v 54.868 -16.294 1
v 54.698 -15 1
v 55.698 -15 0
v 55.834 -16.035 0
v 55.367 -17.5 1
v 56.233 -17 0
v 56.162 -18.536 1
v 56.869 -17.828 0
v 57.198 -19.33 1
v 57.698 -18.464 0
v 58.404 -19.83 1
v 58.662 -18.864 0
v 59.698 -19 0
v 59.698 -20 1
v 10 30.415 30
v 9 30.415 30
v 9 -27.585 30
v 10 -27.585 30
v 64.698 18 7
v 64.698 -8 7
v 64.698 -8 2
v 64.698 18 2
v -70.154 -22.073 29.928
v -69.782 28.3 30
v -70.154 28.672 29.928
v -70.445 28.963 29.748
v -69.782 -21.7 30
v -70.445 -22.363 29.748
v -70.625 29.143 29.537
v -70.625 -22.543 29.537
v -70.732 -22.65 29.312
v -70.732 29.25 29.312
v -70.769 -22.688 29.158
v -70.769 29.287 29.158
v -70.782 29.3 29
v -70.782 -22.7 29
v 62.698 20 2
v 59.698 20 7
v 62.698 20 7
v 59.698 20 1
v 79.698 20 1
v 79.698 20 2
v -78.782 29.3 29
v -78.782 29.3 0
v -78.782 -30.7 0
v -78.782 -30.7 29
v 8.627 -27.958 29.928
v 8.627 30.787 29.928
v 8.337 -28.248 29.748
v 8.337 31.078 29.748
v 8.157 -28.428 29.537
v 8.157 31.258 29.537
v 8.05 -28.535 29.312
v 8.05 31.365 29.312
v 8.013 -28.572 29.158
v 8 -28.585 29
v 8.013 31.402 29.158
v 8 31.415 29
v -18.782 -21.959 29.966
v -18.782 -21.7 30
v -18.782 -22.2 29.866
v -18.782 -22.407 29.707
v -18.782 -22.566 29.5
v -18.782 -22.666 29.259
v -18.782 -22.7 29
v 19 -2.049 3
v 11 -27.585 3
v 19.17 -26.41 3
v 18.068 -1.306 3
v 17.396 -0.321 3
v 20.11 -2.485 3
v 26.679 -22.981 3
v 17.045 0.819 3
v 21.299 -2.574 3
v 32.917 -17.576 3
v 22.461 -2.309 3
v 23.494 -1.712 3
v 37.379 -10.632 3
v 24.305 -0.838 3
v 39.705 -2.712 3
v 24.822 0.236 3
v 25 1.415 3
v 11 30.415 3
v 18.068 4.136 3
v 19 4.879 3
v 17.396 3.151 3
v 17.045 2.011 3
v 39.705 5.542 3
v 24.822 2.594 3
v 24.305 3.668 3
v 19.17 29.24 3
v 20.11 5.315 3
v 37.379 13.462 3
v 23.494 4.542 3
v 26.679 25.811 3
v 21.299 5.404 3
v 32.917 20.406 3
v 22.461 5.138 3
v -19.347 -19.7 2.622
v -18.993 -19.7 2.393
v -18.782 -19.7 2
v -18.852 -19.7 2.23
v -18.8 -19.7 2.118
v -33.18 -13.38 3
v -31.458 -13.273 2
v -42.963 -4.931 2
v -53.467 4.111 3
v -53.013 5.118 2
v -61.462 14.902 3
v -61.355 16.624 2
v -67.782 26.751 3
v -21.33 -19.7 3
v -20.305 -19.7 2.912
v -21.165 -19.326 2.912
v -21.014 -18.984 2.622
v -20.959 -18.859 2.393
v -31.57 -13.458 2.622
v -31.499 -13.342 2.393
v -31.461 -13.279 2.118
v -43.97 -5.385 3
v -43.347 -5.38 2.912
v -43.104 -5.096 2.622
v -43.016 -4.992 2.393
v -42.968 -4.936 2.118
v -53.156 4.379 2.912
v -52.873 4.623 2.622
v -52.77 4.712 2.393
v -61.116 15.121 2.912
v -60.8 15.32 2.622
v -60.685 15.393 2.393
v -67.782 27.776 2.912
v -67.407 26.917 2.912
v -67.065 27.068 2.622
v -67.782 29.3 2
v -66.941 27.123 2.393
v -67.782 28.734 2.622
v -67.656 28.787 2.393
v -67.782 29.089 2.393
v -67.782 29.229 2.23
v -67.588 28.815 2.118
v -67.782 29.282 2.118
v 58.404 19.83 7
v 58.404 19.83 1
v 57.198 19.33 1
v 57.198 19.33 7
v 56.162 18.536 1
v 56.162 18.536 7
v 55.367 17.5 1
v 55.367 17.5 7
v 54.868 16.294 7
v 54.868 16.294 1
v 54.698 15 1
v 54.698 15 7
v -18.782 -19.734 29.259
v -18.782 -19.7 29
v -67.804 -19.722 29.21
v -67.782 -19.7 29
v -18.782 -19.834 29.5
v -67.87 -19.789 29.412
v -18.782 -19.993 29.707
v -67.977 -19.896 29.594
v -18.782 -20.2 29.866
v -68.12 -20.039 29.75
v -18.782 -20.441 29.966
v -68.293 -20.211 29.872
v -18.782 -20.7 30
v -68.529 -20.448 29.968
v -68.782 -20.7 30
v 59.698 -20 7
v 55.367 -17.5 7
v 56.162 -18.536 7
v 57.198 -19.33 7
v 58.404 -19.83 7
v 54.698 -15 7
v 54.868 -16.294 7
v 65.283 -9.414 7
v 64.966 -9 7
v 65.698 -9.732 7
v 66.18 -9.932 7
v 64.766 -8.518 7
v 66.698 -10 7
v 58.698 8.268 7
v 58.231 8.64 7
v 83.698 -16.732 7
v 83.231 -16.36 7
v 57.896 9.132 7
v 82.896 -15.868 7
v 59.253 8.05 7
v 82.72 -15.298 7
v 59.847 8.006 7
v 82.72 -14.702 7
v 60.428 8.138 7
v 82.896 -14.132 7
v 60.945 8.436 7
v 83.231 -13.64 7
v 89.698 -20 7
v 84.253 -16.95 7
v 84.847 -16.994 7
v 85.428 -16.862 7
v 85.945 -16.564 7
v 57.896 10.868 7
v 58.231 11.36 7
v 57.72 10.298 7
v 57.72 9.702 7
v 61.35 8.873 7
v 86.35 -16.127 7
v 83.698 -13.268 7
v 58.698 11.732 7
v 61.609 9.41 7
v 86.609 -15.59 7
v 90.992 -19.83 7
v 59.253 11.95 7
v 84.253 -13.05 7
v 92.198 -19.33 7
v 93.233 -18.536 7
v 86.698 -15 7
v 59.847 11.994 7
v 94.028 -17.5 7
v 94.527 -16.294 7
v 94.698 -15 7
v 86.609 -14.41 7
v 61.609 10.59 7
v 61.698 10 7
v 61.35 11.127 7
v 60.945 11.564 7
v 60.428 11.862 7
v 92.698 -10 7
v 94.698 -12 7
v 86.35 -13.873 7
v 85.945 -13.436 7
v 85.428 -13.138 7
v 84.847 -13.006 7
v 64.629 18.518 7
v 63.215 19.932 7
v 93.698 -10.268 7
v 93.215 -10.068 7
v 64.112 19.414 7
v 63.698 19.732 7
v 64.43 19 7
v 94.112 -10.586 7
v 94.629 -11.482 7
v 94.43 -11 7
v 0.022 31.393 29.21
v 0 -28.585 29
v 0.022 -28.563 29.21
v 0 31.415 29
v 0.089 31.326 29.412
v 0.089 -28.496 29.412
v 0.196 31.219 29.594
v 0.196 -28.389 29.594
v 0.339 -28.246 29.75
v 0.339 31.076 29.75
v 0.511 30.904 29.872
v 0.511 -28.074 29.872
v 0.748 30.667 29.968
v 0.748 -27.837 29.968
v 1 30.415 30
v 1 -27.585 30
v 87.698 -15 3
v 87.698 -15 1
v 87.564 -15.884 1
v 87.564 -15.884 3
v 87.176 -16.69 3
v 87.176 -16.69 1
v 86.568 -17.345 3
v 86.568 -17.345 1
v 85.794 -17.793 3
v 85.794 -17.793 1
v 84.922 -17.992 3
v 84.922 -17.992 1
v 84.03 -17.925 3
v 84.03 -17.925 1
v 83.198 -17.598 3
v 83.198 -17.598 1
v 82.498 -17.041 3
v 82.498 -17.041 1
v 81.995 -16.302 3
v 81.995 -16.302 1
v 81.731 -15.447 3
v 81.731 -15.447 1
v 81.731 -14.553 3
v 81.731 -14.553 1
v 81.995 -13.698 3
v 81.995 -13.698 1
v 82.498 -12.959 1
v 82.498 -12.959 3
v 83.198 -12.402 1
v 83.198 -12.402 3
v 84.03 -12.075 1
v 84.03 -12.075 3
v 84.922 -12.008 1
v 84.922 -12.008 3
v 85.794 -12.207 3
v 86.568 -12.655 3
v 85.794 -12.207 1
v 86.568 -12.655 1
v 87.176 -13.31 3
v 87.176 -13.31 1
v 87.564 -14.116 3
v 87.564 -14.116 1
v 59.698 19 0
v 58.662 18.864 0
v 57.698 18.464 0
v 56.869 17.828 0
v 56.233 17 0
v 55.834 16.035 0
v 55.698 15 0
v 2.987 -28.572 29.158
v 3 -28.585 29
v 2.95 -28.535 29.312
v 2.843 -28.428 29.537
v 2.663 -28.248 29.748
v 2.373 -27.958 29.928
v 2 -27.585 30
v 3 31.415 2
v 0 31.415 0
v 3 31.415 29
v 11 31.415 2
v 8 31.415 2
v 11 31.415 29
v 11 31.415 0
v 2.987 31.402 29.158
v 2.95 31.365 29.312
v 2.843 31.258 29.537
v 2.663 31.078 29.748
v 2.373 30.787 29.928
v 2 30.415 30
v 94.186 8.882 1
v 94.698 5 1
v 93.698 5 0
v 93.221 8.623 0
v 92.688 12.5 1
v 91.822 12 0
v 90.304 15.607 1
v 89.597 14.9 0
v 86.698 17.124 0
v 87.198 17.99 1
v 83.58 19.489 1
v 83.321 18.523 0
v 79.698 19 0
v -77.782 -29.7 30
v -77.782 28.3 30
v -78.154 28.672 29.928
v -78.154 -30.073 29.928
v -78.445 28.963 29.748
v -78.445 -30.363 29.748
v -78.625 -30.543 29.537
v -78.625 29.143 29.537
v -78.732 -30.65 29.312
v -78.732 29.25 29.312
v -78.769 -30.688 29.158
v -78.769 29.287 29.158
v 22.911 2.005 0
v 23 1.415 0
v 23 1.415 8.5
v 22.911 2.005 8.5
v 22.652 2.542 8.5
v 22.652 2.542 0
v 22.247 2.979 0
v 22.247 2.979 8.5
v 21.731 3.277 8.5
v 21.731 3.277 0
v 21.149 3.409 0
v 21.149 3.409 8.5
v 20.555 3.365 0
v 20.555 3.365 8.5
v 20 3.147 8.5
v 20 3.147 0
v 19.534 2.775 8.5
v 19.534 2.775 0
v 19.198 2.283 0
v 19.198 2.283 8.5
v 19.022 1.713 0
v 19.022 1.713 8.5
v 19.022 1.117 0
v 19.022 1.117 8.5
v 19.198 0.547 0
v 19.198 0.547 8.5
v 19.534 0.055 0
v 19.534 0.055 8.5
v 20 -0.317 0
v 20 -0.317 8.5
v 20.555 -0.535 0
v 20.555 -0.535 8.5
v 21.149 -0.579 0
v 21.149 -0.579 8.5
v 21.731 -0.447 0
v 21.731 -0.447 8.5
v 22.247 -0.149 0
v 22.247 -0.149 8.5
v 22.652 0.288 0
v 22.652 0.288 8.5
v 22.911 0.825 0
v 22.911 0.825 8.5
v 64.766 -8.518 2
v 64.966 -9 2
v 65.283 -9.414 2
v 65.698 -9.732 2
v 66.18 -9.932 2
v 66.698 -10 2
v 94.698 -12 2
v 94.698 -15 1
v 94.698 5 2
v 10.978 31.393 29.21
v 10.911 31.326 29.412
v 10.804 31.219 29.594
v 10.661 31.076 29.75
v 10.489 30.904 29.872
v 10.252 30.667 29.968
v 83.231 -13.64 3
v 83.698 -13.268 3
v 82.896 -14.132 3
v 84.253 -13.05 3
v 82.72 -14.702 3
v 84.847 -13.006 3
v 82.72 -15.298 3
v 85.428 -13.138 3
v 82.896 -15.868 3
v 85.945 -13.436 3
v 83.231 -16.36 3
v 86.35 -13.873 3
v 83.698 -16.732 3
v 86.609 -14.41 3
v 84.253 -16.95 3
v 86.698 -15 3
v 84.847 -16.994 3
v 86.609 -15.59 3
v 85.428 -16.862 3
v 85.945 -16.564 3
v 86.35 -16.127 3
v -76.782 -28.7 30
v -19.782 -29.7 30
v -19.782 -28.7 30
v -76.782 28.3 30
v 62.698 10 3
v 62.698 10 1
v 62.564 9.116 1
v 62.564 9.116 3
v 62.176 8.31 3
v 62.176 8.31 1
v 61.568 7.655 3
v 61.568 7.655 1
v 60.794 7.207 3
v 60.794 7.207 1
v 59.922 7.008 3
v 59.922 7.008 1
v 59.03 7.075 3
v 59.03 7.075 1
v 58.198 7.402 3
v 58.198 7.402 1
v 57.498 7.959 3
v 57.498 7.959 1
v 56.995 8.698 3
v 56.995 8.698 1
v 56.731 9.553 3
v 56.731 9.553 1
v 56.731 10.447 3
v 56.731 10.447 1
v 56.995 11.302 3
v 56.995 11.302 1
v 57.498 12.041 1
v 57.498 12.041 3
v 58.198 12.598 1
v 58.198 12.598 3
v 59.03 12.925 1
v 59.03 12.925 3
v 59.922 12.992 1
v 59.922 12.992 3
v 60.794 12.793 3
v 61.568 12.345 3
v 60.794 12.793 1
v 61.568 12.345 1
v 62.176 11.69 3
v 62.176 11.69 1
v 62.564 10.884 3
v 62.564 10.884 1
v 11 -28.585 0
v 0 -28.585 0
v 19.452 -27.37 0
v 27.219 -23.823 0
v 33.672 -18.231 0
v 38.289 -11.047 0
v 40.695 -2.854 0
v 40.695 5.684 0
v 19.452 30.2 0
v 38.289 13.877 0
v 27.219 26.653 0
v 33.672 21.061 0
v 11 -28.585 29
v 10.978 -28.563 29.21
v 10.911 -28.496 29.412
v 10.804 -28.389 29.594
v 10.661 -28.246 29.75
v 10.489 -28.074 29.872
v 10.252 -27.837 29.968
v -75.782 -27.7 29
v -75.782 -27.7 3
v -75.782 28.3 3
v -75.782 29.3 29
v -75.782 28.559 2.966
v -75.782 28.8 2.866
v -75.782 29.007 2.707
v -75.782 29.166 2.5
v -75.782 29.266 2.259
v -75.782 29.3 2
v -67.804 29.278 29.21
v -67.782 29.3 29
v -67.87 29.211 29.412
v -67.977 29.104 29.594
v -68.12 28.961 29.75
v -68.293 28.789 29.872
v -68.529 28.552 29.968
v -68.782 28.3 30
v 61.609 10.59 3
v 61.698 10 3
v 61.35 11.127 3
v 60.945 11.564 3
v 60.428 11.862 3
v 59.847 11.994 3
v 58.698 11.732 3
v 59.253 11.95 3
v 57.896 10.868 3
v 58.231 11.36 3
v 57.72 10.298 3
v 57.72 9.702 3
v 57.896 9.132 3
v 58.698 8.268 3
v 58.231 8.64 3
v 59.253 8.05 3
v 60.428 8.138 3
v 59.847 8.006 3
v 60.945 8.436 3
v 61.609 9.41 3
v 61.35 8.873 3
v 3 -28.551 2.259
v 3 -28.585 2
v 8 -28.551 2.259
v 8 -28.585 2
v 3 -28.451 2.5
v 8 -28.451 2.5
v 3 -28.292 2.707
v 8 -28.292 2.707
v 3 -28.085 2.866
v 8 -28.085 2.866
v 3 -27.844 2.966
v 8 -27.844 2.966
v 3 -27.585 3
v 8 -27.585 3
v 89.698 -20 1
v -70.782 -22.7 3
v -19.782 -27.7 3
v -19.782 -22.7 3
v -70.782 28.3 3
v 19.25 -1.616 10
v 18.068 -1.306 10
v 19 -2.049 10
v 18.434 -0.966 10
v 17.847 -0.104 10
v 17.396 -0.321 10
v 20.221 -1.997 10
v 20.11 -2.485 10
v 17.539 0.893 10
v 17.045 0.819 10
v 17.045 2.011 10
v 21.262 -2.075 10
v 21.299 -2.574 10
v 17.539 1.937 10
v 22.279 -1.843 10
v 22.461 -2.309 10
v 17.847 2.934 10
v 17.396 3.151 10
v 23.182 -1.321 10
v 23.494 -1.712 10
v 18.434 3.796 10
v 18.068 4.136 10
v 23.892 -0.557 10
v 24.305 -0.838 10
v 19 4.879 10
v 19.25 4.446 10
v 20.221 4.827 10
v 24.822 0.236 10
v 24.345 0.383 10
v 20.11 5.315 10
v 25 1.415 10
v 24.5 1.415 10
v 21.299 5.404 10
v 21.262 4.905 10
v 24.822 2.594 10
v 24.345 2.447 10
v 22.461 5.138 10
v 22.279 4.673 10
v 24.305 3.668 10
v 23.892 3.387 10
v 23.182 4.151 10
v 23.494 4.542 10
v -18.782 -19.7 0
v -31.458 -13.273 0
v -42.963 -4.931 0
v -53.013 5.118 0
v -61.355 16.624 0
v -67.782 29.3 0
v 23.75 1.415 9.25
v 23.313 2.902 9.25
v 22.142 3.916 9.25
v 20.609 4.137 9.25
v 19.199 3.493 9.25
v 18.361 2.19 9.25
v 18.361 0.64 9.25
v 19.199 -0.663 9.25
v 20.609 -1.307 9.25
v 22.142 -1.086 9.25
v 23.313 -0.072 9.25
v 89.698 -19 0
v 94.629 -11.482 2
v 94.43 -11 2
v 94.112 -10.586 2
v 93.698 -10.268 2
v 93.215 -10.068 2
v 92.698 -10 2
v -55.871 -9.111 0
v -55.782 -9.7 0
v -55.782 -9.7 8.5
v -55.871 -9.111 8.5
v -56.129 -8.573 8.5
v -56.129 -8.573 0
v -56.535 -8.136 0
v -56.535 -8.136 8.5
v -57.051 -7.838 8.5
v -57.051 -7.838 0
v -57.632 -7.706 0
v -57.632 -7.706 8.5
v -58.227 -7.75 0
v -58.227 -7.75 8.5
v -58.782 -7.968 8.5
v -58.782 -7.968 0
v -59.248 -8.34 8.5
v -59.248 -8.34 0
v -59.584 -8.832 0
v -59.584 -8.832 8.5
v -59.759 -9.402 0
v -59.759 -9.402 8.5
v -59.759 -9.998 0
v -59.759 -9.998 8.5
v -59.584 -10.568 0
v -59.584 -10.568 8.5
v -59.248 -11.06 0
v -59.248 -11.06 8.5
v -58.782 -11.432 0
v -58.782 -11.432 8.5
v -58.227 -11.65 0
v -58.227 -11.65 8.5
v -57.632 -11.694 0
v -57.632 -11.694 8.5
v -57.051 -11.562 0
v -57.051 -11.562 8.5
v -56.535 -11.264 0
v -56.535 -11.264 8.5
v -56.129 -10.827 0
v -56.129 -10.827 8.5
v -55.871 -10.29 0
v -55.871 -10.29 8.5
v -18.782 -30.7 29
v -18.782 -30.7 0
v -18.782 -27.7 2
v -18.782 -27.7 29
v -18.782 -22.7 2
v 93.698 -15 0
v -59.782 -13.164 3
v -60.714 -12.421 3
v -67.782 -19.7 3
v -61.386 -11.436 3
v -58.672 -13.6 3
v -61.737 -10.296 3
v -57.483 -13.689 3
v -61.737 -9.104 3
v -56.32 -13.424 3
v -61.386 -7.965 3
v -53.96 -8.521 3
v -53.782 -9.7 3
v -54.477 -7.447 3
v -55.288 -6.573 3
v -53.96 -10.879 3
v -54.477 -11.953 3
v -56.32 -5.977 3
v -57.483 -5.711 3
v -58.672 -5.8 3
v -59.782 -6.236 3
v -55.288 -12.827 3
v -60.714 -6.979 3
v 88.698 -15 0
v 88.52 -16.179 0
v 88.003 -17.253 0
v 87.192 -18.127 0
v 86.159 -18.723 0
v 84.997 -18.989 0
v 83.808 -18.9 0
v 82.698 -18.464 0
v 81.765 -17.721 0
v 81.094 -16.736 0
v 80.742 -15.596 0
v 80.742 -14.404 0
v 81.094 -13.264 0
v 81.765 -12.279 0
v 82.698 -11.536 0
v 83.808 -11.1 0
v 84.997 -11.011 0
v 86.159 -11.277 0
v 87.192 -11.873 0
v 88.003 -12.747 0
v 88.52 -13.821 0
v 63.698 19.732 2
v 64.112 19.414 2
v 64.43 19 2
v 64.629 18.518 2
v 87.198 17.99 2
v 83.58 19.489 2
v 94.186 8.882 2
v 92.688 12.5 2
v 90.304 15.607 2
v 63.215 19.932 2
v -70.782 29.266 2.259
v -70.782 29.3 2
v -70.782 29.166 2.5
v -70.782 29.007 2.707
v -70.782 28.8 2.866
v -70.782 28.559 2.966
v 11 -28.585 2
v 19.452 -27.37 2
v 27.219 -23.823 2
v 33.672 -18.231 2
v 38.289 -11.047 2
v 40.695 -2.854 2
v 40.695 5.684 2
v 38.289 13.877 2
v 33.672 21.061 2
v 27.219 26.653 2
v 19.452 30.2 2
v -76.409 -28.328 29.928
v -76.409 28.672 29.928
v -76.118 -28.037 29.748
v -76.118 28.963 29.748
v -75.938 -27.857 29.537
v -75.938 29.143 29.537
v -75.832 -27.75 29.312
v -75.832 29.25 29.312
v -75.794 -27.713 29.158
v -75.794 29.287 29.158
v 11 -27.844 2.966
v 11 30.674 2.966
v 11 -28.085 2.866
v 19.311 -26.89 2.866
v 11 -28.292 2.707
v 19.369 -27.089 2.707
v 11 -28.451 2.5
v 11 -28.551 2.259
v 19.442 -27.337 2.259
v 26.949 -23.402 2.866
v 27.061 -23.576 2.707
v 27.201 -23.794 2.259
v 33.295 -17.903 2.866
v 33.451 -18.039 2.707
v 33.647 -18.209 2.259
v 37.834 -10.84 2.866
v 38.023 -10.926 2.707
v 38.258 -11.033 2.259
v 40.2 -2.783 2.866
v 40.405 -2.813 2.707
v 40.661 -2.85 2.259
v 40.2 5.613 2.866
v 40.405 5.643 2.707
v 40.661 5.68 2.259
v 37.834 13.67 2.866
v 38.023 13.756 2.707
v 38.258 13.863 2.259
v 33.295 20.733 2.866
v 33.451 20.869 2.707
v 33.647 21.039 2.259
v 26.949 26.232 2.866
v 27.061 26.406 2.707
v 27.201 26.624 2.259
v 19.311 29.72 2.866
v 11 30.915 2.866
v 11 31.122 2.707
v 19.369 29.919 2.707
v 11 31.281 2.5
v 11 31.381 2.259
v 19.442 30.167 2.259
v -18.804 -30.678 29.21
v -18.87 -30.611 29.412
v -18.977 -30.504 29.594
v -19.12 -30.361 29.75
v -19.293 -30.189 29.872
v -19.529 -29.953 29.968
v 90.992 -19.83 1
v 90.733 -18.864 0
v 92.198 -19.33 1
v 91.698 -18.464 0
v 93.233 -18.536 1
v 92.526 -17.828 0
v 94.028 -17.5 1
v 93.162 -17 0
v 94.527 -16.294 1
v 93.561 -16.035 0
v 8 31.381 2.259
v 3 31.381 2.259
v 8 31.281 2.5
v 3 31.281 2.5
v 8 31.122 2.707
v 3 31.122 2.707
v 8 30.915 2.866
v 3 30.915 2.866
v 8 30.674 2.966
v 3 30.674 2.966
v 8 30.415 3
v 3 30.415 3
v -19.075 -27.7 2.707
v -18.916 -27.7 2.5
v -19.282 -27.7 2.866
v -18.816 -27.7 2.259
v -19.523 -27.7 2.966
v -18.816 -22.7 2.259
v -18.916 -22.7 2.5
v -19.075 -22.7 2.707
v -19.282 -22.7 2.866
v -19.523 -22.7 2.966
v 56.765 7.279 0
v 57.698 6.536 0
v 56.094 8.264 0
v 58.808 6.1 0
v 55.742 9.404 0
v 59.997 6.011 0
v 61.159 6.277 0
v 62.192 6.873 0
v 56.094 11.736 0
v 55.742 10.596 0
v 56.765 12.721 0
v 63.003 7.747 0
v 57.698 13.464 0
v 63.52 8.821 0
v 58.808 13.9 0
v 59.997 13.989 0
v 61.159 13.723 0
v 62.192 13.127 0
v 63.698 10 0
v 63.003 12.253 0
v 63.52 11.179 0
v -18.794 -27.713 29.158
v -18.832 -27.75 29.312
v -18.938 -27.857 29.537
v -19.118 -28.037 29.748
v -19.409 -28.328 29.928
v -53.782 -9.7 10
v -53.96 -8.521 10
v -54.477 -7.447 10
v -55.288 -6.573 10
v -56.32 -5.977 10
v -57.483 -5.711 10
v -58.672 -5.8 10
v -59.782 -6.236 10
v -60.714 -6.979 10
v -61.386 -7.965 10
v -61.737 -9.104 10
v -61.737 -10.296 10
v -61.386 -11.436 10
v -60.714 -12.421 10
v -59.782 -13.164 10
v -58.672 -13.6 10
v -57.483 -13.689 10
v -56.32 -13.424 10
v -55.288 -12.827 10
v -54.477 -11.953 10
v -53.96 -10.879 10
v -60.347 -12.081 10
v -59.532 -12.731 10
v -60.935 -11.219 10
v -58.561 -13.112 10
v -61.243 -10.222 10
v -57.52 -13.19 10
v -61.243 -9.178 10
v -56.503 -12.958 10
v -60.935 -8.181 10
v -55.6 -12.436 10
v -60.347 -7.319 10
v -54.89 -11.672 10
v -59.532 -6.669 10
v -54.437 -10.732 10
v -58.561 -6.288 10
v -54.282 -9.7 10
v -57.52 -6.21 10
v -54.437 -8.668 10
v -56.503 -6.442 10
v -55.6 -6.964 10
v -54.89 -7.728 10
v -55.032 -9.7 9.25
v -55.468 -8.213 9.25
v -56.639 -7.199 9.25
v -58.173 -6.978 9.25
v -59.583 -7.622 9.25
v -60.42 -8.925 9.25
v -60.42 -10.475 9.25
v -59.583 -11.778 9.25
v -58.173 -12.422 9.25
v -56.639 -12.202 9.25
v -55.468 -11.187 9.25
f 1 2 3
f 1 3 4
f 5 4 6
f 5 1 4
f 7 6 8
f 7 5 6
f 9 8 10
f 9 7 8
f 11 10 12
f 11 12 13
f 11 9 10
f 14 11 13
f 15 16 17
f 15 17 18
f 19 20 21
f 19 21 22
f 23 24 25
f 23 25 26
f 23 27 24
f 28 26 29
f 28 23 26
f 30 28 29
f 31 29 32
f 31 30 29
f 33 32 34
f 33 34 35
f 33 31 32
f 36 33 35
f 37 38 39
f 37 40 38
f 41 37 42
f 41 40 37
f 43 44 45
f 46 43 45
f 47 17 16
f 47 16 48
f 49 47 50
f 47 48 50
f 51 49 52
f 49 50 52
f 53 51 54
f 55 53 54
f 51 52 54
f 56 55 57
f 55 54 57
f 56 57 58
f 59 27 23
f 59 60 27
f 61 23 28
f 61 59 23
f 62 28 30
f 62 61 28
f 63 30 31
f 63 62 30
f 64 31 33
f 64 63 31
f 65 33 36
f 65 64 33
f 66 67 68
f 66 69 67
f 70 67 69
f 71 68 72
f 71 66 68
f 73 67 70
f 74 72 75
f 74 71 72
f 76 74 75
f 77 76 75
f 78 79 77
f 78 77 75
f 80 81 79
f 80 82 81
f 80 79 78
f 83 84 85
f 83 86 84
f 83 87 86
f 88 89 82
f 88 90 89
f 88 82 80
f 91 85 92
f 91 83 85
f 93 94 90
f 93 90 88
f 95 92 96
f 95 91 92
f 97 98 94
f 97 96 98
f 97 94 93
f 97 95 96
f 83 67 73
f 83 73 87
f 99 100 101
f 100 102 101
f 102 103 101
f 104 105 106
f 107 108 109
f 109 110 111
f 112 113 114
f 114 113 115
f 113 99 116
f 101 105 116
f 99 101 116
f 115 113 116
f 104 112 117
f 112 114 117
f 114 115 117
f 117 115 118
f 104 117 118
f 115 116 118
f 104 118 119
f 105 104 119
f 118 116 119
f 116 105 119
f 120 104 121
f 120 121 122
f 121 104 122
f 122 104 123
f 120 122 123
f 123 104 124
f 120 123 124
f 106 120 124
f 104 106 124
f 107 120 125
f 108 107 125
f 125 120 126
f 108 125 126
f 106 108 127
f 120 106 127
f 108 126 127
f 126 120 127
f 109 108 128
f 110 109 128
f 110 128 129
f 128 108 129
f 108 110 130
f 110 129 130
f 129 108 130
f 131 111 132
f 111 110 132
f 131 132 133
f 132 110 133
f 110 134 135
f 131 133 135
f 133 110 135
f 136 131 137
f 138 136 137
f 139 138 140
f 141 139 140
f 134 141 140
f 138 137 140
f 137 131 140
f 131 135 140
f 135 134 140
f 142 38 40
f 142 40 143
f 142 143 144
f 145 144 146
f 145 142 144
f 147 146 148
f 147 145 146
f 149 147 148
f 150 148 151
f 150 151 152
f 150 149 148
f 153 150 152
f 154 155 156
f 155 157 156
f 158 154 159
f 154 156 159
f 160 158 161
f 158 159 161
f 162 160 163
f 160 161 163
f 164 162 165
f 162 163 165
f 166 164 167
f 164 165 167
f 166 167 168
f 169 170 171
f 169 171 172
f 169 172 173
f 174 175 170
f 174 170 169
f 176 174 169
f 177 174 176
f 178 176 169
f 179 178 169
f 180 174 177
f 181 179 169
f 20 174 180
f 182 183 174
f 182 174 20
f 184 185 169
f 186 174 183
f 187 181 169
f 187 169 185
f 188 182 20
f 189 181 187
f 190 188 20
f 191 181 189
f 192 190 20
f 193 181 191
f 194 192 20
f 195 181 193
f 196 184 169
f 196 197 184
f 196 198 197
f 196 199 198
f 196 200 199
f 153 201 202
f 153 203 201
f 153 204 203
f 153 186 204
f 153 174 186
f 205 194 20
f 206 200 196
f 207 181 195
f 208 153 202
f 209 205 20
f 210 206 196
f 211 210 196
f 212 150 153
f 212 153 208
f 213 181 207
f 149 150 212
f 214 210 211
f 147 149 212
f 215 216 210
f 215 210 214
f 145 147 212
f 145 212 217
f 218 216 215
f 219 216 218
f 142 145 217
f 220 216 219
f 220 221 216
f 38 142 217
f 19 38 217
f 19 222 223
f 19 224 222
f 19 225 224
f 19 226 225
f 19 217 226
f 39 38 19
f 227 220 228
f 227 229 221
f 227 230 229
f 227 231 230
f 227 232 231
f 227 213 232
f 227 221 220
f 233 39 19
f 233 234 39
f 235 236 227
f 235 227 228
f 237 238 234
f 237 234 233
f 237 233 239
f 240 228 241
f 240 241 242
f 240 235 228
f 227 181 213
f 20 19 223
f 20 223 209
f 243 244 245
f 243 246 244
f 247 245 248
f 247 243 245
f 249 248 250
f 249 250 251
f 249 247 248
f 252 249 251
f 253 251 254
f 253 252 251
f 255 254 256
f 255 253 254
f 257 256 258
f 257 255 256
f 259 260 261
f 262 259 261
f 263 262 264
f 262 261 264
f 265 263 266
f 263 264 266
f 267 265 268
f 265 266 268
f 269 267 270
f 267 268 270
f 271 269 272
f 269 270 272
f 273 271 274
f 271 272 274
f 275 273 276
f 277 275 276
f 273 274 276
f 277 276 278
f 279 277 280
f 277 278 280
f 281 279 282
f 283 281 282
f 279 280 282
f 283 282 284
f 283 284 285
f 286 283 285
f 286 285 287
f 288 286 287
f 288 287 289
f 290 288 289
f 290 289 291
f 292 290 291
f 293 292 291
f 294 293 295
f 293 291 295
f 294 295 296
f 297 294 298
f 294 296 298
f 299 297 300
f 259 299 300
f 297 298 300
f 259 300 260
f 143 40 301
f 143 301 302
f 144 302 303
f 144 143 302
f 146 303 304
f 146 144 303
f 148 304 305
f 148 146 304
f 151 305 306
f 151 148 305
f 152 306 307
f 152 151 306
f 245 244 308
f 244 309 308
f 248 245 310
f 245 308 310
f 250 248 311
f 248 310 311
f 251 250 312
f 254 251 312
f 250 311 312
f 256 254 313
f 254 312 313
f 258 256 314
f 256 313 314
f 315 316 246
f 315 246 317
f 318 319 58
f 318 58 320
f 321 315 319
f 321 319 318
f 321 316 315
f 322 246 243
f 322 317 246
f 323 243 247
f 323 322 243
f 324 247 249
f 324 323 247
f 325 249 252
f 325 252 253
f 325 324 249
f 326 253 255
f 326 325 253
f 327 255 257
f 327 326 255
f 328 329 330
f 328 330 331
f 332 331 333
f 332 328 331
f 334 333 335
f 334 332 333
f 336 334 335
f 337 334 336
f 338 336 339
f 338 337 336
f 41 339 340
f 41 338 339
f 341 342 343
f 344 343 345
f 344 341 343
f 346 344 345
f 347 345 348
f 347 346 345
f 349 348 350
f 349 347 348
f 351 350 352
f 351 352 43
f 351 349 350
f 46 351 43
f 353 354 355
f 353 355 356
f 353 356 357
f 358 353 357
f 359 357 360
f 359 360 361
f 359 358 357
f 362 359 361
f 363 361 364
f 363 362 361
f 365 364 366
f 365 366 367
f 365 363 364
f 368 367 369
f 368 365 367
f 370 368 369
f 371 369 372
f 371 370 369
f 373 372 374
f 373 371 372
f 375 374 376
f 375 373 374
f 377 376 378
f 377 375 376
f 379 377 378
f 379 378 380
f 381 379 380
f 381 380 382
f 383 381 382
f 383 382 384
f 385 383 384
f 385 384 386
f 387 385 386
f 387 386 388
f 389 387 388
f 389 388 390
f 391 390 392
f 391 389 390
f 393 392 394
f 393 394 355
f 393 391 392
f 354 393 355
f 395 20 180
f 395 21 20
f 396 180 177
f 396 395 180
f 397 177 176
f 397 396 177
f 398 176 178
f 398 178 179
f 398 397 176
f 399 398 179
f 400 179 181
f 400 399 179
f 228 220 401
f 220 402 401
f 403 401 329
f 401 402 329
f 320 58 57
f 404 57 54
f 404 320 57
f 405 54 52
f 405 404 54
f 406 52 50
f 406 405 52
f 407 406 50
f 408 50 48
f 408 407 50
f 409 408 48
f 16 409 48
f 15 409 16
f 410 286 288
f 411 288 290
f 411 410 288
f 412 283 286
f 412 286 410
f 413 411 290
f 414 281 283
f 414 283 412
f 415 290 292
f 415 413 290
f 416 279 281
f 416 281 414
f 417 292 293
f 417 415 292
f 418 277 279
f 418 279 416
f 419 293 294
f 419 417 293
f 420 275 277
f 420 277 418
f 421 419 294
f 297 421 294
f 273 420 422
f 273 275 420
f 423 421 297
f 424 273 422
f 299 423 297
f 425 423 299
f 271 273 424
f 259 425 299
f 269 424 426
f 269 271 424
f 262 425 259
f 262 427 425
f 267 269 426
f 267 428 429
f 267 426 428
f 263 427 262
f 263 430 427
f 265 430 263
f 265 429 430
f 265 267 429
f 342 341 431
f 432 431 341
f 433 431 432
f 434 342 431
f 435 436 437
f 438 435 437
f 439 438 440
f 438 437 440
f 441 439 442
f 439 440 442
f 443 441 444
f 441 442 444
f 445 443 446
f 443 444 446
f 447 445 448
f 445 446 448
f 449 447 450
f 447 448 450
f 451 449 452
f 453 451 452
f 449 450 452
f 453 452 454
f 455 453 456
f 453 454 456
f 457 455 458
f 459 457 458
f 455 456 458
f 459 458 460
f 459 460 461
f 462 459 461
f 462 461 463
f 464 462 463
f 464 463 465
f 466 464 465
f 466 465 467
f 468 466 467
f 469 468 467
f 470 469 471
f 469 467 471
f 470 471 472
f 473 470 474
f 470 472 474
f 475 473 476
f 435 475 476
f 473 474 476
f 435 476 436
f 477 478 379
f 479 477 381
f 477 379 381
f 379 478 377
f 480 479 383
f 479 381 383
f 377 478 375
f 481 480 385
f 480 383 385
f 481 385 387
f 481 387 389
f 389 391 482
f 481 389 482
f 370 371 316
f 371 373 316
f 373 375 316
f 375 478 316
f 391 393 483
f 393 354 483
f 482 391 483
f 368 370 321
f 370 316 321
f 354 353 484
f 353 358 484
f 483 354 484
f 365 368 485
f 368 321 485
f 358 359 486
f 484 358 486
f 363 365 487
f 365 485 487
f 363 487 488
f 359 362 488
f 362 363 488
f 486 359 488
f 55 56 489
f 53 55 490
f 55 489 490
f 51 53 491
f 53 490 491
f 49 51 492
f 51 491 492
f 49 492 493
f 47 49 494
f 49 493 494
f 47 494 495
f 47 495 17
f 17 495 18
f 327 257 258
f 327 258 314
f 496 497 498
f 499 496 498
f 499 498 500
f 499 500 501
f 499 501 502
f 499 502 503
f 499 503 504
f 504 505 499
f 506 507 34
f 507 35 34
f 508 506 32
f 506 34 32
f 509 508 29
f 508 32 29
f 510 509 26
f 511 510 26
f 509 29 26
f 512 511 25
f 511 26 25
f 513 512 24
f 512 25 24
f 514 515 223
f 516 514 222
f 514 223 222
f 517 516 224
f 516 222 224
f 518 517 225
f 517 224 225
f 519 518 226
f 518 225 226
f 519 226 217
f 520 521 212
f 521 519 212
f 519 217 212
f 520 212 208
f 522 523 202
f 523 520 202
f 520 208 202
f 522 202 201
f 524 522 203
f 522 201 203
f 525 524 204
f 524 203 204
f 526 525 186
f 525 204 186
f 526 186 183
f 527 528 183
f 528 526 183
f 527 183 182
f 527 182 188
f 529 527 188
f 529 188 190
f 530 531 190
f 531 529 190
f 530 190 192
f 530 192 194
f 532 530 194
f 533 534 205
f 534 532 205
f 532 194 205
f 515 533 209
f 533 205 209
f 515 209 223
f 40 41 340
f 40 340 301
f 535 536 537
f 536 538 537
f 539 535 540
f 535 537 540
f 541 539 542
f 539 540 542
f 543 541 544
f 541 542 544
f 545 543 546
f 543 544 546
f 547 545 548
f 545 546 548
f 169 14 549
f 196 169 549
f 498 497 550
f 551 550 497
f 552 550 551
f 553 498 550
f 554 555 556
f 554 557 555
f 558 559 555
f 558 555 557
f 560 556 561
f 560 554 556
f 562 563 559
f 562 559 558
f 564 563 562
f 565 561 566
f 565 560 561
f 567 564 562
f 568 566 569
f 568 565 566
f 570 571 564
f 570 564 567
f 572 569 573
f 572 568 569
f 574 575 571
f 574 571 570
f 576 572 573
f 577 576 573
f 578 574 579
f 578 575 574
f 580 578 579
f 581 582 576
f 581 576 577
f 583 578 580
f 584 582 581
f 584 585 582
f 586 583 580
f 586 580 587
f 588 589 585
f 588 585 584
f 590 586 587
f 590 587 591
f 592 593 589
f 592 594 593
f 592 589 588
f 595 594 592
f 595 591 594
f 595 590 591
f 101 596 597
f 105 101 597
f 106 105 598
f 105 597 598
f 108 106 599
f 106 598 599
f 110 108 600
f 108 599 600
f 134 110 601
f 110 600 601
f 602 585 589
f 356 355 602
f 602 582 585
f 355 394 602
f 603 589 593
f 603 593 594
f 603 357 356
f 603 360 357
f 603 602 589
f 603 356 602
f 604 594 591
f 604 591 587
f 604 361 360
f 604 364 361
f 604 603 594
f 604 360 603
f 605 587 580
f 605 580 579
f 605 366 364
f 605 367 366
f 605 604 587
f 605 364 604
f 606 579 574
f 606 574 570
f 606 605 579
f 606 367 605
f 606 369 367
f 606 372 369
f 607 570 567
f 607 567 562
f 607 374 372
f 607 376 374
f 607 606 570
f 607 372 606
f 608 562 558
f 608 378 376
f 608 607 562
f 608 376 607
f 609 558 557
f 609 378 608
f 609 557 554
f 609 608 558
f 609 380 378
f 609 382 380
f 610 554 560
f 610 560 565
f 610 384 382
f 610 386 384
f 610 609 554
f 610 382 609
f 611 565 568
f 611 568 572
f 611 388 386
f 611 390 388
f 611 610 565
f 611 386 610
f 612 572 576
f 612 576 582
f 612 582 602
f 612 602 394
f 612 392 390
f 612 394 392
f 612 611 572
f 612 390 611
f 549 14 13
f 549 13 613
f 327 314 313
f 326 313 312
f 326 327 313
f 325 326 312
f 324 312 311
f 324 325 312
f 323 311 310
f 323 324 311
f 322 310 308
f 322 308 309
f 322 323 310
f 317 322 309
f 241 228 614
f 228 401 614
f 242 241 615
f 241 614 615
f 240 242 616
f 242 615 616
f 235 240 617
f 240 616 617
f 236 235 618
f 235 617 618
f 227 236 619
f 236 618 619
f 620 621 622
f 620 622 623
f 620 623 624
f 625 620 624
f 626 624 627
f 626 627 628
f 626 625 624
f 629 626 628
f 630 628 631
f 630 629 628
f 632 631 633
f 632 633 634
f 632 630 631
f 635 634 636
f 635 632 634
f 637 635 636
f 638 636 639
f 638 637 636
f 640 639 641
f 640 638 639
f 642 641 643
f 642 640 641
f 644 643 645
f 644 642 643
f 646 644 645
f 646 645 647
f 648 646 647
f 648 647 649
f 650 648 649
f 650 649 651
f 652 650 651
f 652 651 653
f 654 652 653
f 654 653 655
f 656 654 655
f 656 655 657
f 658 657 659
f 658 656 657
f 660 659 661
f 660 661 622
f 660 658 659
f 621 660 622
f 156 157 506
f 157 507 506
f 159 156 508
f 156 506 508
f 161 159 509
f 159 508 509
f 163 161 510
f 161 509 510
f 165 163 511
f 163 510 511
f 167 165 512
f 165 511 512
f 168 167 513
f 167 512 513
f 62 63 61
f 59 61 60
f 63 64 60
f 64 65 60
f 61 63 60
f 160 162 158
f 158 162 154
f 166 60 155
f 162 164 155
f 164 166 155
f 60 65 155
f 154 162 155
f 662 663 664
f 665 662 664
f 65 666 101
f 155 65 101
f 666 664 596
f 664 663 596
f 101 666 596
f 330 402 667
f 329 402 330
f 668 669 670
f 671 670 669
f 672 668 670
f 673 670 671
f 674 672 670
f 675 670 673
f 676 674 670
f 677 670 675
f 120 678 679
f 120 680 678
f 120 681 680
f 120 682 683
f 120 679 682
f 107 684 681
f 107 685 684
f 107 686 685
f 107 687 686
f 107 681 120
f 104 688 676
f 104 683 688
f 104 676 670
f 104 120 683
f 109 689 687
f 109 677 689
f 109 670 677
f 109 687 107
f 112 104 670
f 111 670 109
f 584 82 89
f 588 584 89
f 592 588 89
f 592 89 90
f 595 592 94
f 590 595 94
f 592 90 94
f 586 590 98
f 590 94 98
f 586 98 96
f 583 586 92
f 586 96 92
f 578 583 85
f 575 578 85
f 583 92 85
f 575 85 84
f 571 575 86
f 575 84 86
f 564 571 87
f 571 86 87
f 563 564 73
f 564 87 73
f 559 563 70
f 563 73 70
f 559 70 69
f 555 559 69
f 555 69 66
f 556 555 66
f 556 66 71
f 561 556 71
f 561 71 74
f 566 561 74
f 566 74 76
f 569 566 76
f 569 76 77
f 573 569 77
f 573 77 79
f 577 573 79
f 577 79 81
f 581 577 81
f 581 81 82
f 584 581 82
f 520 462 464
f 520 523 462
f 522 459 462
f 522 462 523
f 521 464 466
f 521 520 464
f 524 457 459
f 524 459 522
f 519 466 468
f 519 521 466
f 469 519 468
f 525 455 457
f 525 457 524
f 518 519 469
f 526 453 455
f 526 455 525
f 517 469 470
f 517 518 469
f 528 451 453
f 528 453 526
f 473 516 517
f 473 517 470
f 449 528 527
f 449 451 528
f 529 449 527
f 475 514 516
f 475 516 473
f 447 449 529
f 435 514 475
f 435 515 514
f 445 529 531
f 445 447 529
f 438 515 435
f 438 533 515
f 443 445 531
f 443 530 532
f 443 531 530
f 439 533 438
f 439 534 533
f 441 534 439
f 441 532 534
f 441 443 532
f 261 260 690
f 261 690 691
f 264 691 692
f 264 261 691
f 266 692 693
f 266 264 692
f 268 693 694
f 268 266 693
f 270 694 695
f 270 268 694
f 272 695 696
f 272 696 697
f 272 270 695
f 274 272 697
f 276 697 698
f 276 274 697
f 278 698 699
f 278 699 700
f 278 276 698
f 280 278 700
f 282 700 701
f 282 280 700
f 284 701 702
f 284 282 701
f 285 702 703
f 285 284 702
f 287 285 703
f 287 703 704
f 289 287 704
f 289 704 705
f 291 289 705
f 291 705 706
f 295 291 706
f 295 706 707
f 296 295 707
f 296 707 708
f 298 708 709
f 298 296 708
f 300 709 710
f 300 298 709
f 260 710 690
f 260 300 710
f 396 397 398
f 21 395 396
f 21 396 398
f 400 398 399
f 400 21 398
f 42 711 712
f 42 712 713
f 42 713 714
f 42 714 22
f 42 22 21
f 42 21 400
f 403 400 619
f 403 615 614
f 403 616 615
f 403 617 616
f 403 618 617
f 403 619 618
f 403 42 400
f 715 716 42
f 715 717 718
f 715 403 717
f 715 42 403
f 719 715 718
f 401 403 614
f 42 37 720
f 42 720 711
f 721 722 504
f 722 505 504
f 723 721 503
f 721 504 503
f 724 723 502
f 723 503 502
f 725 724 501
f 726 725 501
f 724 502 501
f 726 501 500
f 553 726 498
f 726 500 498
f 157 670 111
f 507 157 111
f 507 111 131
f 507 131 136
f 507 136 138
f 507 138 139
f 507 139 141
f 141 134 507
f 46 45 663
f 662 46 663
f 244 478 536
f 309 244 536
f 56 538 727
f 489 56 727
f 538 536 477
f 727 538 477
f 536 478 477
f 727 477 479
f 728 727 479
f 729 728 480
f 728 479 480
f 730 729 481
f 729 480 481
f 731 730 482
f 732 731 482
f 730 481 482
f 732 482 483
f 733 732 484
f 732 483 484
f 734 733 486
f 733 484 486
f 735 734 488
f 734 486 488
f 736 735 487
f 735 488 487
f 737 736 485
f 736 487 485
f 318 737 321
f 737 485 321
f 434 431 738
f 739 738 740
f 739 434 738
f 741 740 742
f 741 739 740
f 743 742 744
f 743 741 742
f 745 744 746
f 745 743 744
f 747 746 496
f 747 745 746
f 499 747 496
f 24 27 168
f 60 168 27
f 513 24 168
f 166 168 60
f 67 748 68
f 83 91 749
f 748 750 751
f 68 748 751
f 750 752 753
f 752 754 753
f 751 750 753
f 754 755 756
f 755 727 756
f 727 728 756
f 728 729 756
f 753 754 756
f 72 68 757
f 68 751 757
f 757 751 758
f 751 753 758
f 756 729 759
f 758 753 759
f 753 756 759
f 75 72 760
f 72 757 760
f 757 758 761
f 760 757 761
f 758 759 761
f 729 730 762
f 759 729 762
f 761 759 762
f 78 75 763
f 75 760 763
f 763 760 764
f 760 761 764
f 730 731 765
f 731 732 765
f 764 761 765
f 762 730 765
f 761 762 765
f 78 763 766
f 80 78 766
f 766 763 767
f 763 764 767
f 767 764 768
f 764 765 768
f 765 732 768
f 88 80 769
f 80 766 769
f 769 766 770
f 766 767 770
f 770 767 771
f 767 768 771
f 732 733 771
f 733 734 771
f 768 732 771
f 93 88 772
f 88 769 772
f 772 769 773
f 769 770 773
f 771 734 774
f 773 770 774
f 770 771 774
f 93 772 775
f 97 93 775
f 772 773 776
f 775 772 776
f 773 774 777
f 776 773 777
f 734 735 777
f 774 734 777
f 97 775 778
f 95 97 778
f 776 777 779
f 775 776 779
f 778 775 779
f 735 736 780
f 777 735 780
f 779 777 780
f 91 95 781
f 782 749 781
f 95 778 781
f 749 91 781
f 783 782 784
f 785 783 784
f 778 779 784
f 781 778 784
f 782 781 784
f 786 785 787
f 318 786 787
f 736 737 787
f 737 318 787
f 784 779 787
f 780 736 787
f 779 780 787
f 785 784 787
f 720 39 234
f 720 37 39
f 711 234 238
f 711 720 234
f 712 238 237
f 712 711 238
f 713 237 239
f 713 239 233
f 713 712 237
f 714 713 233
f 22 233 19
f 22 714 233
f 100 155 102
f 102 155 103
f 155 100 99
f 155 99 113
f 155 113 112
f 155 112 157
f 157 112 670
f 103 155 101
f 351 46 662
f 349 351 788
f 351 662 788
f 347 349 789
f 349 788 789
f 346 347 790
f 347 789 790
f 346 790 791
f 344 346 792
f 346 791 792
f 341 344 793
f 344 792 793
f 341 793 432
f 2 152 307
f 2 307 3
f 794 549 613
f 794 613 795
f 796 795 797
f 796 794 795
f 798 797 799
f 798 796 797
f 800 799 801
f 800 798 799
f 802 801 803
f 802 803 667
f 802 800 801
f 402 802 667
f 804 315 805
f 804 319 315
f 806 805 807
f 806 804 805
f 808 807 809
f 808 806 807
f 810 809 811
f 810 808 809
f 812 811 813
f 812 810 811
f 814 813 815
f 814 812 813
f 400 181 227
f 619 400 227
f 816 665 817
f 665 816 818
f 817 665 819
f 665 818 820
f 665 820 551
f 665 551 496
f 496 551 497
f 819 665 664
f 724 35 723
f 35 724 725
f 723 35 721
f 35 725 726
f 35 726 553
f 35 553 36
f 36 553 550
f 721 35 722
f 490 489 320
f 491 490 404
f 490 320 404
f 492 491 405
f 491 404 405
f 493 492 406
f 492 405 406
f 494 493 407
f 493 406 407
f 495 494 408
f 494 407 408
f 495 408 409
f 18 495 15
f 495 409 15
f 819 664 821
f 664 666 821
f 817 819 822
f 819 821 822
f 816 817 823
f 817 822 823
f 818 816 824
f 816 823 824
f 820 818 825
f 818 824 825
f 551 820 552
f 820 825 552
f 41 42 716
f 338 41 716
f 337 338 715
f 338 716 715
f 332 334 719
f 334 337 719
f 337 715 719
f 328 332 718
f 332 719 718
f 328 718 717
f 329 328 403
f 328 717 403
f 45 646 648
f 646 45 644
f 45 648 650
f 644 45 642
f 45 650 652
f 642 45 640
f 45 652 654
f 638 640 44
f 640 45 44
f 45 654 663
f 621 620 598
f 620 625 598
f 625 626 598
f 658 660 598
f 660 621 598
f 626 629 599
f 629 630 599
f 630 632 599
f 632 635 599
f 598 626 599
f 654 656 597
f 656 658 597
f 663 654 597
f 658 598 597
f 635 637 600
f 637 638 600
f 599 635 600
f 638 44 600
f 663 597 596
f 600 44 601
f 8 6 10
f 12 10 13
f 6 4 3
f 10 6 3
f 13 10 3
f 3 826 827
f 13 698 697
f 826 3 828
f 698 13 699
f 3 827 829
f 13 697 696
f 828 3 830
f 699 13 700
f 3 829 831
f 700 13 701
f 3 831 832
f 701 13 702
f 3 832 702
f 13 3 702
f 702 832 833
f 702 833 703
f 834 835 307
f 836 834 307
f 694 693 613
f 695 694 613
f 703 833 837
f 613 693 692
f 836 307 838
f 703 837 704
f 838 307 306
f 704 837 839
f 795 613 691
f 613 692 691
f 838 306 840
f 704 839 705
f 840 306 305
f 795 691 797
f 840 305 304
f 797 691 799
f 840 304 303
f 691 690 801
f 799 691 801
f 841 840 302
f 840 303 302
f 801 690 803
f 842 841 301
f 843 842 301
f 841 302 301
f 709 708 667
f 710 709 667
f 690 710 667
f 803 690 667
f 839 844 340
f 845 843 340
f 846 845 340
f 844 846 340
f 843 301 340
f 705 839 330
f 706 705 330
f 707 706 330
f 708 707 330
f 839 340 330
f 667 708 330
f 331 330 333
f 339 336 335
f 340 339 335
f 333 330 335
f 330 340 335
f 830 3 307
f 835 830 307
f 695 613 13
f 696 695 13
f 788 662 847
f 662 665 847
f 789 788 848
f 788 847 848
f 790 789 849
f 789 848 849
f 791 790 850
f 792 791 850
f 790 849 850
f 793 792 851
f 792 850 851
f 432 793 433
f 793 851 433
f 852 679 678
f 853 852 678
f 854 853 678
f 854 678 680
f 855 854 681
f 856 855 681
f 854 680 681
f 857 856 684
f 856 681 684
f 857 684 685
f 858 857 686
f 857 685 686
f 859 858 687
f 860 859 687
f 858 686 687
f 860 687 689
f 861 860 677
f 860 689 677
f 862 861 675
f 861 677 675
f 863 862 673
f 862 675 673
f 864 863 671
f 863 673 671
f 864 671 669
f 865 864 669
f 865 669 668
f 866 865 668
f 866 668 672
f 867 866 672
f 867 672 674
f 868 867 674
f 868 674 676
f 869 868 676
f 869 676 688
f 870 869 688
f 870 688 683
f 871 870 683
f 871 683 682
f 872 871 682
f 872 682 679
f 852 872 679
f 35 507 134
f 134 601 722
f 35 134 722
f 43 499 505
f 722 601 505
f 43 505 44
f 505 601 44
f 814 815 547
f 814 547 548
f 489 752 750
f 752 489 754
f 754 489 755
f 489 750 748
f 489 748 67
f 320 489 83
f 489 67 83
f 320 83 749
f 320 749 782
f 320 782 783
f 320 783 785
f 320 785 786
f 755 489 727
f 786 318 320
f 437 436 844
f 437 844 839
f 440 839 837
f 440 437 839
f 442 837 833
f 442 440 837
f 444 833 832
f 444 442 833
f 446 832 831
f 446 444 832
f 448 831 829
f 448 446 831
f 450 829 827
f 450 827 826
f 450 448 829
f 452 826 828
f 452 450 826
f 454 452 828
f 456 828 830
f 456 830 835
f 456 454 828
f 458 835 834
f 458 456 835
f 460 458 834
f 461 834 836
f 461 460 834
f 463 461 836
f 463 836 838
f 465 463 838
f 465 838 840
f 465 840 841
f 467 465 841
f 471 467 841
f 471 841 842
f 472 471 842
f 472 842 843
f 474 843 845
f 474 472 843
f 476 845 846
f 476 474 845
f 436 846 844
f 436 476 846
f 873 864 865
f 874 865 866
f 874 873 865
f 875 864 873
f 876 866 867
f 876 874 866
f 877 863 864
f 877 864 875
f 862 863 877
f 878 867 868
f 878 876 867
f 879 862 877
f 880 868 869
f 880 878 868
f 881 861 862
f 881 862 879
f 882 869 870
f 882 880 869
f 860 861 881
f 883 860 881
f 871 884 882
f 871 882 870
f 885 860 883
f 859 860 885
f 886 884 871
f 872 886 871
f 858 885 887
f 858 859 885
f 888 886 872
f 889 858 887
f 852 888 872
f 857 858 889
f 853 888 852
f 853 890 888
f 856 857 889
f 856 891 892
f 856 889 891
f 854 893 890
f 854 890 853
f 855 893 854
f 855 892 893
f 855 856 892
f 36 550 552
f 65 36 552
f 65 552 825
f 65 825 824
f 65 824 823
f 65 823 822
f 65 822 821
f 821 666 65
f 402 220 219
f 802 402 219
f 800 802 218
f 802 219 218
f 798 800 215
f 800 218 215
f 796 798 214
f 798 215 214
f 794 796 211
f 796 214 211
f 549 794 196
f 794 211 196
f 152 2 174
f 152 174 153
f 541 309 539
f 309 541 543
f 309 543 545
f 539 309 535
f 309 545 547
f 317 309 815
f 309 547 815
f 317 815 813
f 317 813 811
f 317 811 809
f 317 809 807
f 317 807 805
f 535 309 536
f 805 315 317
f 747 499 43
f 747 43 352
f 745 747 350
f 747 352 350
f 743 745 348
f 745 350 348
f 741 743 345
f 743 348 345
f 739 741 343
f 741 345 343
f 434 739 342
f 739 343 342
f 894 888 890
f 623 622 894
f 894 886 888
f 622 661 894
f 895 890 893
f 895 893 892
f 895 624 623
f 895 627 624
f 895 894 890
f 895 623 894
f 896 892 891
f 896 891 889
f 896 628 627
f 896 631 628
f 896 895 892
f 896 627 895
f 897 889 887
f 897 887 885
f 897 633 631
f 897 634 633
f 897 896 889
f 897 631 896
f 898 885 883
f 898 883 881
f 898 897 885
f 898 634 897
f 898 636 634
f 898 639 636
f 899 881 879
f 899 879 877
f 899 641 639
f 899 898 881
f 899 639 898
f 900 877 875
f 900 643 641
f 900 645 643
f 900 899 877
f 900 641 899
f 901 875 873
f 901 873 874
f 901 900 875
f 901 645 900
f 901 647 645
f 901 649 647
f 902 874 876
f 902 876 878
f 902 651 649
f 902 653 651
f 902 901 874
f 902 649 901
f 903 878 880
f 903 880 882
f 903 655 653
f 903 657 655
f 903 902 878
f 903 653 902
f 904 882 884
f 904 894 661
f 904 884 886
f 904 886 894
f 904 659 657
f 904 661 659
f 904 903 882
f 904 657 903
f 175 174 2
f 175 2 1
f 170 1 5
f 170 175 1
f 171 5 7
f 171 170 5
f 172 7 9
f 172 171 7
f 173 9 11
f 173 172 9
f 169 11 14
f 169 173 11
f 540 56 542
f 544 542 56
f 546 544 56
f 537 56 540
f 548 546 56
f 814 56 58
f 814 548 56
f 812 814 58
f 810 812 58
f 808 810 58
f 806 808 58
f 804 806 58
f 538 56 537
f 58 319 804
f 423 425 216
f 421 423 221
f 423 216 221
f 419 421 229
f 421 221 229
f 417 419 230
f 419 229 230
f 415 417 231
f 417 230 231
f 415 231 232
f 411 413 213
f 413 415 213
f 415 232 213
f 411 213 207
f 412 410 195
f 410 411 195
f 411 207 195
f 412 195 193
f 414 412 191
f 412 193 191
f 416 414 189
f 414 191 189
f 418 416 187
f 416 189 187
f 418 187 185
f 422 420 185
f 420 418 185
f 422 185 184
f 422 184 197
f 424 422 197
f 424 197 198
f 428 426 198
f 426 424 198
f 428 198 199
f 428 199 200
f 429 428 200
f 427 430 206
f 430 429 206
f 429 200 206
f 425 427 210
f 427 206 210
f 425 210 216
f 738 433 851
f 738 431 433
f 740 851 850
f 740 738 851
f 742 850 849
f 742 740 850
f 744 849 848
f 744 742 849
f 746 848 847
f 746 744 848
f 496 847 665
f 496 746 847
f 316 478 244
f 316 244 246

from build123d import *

# Parameters (mm, degrees)
F0_R      = 4
F1_DEPTH  = 3
F2_DEPTH  = 30
F0_R_2    = 2
F3_DEPTH  = 10
F4_R      = 1
F5_SIZE   = 1.5
F6_W      = 5
F6_H      = 60
F7_DEPTH  = 3
F6_R      = 4
F6_W_2    = 3
F8_DEPTH  = 30
F6_R_2    = 2
F9_DEPTH  = 10
F10_SIZE  = 1.5
F11_R     = 1
F12_W     = 40
F12_H     = 40
F13_DEPTH = 7
F14_W     = 30
F14_H     = 30
F15_DEPTH = 5
F14_R     = 2
F16_DEPTH = 25
F17_R     = 3
F17_R_2   = 2
F18_DEPTH = 3
F19_R     = 15
F20_R     = 5
F21_SIZE  = 0.99999
F22_R     = 2


# Not quite as in the source:
# - a fillet or chamfer is up to 0.001 mm smaller than in the source, because OpenCascade refuses the exact size


with BuildPart() as f1:
    # F0 (on Top) → F1 (new body)
    with BuildSketch(Plane.XY):
        with BuildLine():
            ThreePointArc((-18.7818011097, -19.7000644691), (-48.186838974, -0.1051023334), (-67.7818011097, 29.2999355309))
            Line((-67.7818011097, 29.2999355309), (-67.7818011097, -19.7000644691))
            Line((-67.7818011097, -19.7000644691), (-18.7818011097, -19.7000644691))
        make_face()
        with Locations((-57.7818011097, -9.7000644691)):
            Circle(F0_R, mode=Mode.SUBTRACT)
    extrude(amount=F1_DEPTH)



with BuildPart() as f1b:
    # F0 (on Top) → F1, piece 2 (new body)
    with BuildSketch(Plane.XY):
        Polygon((-70.7818011097, 29.2999355309), (-75.7818011097, 29.2999355309), (-75.7818011097, -27.7000644691), (-18.7818011097, -27.7000644691), (-18.7818011097, -22.7000644691), (-70.7818011097, -22.7000644691), align=None)
    extrude(amount=F1_DEPTH)


with BuildPart() as f1_1:
    add(f1.part)

    add(f1b.part)  # F2 merges F1b
    # F0 (on Top) → F2 (join)
    with BuildSketch(Plane.XY):
        Polygon((-75.7818011097, 29.2999355309), (-78.7818011097, 29.2999355309), (-78.7818011097, -30.7000644691), (-18.7818011097, -30.7000644691), (-18.7818011097, -27.7000644691), (-75.7818011097, -27.7000644691), align=None)
        Polygon((-67.7818011097, 29.2999355309), (-70.7818011097, 29.2999355309), (-70.7818011097, -22.7000644691), (-18.7818011097, -22.7000644691), (-18.7818011097, -19.7000644691), (-67.7818011097, -19.7000644691), align=None)
    extrude(amount=F2_DEPTH)

    # F0 (on Top) → F3 (join)
    with BuildSketch(Plane.XY):
        with Locations((-57.7818011097, -9.7000644691)):
            Circle(F0_R)
        with Locations((-57.7818011097, -9.7000644691)):
            Circle(F0_R_2, mode=Mode.SUBTRACT)
    extrude(amount=F3_DEPTH)

    # F4
    f4_edges = [f1_1.edges().sort_by_distance(p)[0] for p in [
        (-78.781801, -0.700064, 30),
        (-48.781801, -30.700064, 30),
        (-44.781801, -22.700064, 30),
        (-70.781801, 3.299936, 30),
        (-67.781801, 4.799936, 30),
        (-43.281801, -19.700064, 30),
        (-75.781801, 0.799936, 30),
        (-47.281801, -27.700064, 30),
        (-77.281801, 29.299936, 30),
        (-69.281801, 29.299936, 30),
        (-18.781801, -29.200064, 30),
        (-48.186839, -0.105102, 3),
        (-18.781801, -25.200064, 3),
        (-73.281801, 29.299936, 3),
    ]]
    fillet(f4_edges, radius=F4_R)

    # F5
    f5_edges = [f1_1.edges().sort_by_distance(p)[0] for p in [
        (-59.781801, -9.700064, 10),
    ]]
    chamfer(f5_edges, length=F5_SIZE)


with BuildPart() as f7:
    # F6 (on Top) → F7 (new body)
    with BuildSketch(Plane.XY):
        with Locations((5.5, 1.4149925858)):
            Rectangle(F6_W, F6_H)
    extrude(amount=F7_DEPTH)



with BuildPart() as f7b:
    # F6 (on Top) → F7, piece 2 (new body)
    with BuildSketch(Plane.XY):
        with BuildLine():
            ThreePointArc((11, -28.5850074142), (41, 1.4149925858), (11, 31.4149925858))
            Line((11, 31.4149925858), (11, -28.5850074142))
        make_face()
        with Locations((21, 1.4149925858)):
            Circle(F6_R, mode=Mode.SUBTRACT)
    extrude(amount=F7_DEPTH)


with BuildPart() as f7_1:
    add(f7.part)

    add(f7b.part)  # F8 merges F7b
    # F6 (on Top) → F8 (join)
    with BuildSketch(Plane.XY):
        with Locations((1.5, 1.4149925858)):
            Rectangle(F6_W_2, F6_H)
        with Locations((9.5, 1.4149925858)):
            Rectangle(F6_W_2, F6_H)
    extrude(amount=F8_DEPTH)

    # F6 (on Top) → F9 (join)
    with BuildSketch(Plane.XY):
        with Locations((21, 1.4149925858)):
            Circle(F6_R)
        with Locations((21, 1.4149925858)):
            Circle(F6_R_2, mode=Mode.SUBTRACT)
    extrude(amount=F9_DEPTH)

    # F10
    f10_edges = [f7_1.edges().sort_by_distance(p)[0] for p in [
        (19, 1.414993, 10),
    ]]
    chamfer(f10_edges, length=F10_SIZE)

    # F11
    f11_edges = [f7_1.edges().sort_by_distance(p)[0] for p in [
        (0, 1.414993, 30),
        (3, 1.414993, 30),
        (8, 1.414993, 30),
        (11, 1.414993, 30),
        (9.5, -28.585007, 30),
        (1.5, -28.585007, 30),
        (5.5, -28.585007, 3),
        (41, 1.414993, 3),
        (1.5, 31.414993, 30),
        (9.5, 31.414993, 30),
        (5.5, 31.414993, 3),
    ]]
    fillet(f11_edges, radius=F11_R)


with BuildPart() as f13:
    # F12 (on Top) → F13 (new body)
    with BuildSketch(Plane.XY):
        with Locations((74.6976004541, 0)):
            Rectangle(F12_W, F12_H)
    extrude(amount=F13_DEPTH)

    # F14 (on face) → F15 (cut)
    with BuildSketch(Plane.XY.offset(7)):
        with Locations((79.6976004541, 5)):
            Rectangle(F14_W, F14_H)
    extrude(amount=-F15_DEPTH, mode=Mode.SUBTRACT)

    # F14 (on face) → F16 (cut)
    with BuildSketch(Plane.XY.offset(7)):
        with Locations((59.6976004541, 10)):
            Circle(F14_R)
        with Locations((84.6976004541, -15)):
            Circle(F14_R)
    extrude(amount=-F16_DEPTH, mode=Mode.SUBTRACT)

    # F17 (on face) → F18 (cut)
    with BuildSketch(Plane(origin=(0, 0, 0), x_dir=(1, 0, 0), z_dir=(0, 0, -1))):
        with Locations((59.6976004541, -10)):
            Circle(F17_R)
        with Locations((59.6976004541, -10)):
            Circle(F17_R_2, mode=Mode.SUBTRACT)
        with Locations((84.6976004541, 15)):
            Circle(F17_R)
        with Locations((84.6976004541, 15)):
            Circle(F17_R_2, mode=Mode.SUBTRACT)
    extrude(amount=-F18_DEPTH, mode=Mode.SUBTRACT)

    # F19
    f19_edges = [f13.edges().sort_by_distance(p)[0] for p in [
        (94.6976, 20, 1),
    ]]
    fillet(f19_edges, radius=F19_R)

    # F20
    f20_edges = [f13.edges().sort_by_distance(p)[0] for p in [
        (54.6976, 20, 3.5),
        (94.6976, -20, 3.5),
        (54.6976, -20, 3.5),
    ]]
    fillet(f20_edges, radius=F20_R)

    # F21 (size 1 in the source; OpenCascade refuses exactly that, so slightly less here)
    f21_edges = [f13.edges().sort_by_distance(p)[0] for p in [
        (94.6976, -5, 0),
        (56.6976, 10, 0),
        (81.6976, -15, 0),
    ]]
    chamfer(f21_edges, length=F21_SIZE)

    # F22
    f22_edges = [f13.edges().sort_by_distance(p)[0] for p in [
        (64.6976, 20, 4.5),
        (94.6976, -10, 4.5),
        (64.6976, -10, 4.5),
    ]]
    fillet(f22_edges, radius=F22_R)


solid = Compound([f1_1.part, f7_1.part, f13.part])
